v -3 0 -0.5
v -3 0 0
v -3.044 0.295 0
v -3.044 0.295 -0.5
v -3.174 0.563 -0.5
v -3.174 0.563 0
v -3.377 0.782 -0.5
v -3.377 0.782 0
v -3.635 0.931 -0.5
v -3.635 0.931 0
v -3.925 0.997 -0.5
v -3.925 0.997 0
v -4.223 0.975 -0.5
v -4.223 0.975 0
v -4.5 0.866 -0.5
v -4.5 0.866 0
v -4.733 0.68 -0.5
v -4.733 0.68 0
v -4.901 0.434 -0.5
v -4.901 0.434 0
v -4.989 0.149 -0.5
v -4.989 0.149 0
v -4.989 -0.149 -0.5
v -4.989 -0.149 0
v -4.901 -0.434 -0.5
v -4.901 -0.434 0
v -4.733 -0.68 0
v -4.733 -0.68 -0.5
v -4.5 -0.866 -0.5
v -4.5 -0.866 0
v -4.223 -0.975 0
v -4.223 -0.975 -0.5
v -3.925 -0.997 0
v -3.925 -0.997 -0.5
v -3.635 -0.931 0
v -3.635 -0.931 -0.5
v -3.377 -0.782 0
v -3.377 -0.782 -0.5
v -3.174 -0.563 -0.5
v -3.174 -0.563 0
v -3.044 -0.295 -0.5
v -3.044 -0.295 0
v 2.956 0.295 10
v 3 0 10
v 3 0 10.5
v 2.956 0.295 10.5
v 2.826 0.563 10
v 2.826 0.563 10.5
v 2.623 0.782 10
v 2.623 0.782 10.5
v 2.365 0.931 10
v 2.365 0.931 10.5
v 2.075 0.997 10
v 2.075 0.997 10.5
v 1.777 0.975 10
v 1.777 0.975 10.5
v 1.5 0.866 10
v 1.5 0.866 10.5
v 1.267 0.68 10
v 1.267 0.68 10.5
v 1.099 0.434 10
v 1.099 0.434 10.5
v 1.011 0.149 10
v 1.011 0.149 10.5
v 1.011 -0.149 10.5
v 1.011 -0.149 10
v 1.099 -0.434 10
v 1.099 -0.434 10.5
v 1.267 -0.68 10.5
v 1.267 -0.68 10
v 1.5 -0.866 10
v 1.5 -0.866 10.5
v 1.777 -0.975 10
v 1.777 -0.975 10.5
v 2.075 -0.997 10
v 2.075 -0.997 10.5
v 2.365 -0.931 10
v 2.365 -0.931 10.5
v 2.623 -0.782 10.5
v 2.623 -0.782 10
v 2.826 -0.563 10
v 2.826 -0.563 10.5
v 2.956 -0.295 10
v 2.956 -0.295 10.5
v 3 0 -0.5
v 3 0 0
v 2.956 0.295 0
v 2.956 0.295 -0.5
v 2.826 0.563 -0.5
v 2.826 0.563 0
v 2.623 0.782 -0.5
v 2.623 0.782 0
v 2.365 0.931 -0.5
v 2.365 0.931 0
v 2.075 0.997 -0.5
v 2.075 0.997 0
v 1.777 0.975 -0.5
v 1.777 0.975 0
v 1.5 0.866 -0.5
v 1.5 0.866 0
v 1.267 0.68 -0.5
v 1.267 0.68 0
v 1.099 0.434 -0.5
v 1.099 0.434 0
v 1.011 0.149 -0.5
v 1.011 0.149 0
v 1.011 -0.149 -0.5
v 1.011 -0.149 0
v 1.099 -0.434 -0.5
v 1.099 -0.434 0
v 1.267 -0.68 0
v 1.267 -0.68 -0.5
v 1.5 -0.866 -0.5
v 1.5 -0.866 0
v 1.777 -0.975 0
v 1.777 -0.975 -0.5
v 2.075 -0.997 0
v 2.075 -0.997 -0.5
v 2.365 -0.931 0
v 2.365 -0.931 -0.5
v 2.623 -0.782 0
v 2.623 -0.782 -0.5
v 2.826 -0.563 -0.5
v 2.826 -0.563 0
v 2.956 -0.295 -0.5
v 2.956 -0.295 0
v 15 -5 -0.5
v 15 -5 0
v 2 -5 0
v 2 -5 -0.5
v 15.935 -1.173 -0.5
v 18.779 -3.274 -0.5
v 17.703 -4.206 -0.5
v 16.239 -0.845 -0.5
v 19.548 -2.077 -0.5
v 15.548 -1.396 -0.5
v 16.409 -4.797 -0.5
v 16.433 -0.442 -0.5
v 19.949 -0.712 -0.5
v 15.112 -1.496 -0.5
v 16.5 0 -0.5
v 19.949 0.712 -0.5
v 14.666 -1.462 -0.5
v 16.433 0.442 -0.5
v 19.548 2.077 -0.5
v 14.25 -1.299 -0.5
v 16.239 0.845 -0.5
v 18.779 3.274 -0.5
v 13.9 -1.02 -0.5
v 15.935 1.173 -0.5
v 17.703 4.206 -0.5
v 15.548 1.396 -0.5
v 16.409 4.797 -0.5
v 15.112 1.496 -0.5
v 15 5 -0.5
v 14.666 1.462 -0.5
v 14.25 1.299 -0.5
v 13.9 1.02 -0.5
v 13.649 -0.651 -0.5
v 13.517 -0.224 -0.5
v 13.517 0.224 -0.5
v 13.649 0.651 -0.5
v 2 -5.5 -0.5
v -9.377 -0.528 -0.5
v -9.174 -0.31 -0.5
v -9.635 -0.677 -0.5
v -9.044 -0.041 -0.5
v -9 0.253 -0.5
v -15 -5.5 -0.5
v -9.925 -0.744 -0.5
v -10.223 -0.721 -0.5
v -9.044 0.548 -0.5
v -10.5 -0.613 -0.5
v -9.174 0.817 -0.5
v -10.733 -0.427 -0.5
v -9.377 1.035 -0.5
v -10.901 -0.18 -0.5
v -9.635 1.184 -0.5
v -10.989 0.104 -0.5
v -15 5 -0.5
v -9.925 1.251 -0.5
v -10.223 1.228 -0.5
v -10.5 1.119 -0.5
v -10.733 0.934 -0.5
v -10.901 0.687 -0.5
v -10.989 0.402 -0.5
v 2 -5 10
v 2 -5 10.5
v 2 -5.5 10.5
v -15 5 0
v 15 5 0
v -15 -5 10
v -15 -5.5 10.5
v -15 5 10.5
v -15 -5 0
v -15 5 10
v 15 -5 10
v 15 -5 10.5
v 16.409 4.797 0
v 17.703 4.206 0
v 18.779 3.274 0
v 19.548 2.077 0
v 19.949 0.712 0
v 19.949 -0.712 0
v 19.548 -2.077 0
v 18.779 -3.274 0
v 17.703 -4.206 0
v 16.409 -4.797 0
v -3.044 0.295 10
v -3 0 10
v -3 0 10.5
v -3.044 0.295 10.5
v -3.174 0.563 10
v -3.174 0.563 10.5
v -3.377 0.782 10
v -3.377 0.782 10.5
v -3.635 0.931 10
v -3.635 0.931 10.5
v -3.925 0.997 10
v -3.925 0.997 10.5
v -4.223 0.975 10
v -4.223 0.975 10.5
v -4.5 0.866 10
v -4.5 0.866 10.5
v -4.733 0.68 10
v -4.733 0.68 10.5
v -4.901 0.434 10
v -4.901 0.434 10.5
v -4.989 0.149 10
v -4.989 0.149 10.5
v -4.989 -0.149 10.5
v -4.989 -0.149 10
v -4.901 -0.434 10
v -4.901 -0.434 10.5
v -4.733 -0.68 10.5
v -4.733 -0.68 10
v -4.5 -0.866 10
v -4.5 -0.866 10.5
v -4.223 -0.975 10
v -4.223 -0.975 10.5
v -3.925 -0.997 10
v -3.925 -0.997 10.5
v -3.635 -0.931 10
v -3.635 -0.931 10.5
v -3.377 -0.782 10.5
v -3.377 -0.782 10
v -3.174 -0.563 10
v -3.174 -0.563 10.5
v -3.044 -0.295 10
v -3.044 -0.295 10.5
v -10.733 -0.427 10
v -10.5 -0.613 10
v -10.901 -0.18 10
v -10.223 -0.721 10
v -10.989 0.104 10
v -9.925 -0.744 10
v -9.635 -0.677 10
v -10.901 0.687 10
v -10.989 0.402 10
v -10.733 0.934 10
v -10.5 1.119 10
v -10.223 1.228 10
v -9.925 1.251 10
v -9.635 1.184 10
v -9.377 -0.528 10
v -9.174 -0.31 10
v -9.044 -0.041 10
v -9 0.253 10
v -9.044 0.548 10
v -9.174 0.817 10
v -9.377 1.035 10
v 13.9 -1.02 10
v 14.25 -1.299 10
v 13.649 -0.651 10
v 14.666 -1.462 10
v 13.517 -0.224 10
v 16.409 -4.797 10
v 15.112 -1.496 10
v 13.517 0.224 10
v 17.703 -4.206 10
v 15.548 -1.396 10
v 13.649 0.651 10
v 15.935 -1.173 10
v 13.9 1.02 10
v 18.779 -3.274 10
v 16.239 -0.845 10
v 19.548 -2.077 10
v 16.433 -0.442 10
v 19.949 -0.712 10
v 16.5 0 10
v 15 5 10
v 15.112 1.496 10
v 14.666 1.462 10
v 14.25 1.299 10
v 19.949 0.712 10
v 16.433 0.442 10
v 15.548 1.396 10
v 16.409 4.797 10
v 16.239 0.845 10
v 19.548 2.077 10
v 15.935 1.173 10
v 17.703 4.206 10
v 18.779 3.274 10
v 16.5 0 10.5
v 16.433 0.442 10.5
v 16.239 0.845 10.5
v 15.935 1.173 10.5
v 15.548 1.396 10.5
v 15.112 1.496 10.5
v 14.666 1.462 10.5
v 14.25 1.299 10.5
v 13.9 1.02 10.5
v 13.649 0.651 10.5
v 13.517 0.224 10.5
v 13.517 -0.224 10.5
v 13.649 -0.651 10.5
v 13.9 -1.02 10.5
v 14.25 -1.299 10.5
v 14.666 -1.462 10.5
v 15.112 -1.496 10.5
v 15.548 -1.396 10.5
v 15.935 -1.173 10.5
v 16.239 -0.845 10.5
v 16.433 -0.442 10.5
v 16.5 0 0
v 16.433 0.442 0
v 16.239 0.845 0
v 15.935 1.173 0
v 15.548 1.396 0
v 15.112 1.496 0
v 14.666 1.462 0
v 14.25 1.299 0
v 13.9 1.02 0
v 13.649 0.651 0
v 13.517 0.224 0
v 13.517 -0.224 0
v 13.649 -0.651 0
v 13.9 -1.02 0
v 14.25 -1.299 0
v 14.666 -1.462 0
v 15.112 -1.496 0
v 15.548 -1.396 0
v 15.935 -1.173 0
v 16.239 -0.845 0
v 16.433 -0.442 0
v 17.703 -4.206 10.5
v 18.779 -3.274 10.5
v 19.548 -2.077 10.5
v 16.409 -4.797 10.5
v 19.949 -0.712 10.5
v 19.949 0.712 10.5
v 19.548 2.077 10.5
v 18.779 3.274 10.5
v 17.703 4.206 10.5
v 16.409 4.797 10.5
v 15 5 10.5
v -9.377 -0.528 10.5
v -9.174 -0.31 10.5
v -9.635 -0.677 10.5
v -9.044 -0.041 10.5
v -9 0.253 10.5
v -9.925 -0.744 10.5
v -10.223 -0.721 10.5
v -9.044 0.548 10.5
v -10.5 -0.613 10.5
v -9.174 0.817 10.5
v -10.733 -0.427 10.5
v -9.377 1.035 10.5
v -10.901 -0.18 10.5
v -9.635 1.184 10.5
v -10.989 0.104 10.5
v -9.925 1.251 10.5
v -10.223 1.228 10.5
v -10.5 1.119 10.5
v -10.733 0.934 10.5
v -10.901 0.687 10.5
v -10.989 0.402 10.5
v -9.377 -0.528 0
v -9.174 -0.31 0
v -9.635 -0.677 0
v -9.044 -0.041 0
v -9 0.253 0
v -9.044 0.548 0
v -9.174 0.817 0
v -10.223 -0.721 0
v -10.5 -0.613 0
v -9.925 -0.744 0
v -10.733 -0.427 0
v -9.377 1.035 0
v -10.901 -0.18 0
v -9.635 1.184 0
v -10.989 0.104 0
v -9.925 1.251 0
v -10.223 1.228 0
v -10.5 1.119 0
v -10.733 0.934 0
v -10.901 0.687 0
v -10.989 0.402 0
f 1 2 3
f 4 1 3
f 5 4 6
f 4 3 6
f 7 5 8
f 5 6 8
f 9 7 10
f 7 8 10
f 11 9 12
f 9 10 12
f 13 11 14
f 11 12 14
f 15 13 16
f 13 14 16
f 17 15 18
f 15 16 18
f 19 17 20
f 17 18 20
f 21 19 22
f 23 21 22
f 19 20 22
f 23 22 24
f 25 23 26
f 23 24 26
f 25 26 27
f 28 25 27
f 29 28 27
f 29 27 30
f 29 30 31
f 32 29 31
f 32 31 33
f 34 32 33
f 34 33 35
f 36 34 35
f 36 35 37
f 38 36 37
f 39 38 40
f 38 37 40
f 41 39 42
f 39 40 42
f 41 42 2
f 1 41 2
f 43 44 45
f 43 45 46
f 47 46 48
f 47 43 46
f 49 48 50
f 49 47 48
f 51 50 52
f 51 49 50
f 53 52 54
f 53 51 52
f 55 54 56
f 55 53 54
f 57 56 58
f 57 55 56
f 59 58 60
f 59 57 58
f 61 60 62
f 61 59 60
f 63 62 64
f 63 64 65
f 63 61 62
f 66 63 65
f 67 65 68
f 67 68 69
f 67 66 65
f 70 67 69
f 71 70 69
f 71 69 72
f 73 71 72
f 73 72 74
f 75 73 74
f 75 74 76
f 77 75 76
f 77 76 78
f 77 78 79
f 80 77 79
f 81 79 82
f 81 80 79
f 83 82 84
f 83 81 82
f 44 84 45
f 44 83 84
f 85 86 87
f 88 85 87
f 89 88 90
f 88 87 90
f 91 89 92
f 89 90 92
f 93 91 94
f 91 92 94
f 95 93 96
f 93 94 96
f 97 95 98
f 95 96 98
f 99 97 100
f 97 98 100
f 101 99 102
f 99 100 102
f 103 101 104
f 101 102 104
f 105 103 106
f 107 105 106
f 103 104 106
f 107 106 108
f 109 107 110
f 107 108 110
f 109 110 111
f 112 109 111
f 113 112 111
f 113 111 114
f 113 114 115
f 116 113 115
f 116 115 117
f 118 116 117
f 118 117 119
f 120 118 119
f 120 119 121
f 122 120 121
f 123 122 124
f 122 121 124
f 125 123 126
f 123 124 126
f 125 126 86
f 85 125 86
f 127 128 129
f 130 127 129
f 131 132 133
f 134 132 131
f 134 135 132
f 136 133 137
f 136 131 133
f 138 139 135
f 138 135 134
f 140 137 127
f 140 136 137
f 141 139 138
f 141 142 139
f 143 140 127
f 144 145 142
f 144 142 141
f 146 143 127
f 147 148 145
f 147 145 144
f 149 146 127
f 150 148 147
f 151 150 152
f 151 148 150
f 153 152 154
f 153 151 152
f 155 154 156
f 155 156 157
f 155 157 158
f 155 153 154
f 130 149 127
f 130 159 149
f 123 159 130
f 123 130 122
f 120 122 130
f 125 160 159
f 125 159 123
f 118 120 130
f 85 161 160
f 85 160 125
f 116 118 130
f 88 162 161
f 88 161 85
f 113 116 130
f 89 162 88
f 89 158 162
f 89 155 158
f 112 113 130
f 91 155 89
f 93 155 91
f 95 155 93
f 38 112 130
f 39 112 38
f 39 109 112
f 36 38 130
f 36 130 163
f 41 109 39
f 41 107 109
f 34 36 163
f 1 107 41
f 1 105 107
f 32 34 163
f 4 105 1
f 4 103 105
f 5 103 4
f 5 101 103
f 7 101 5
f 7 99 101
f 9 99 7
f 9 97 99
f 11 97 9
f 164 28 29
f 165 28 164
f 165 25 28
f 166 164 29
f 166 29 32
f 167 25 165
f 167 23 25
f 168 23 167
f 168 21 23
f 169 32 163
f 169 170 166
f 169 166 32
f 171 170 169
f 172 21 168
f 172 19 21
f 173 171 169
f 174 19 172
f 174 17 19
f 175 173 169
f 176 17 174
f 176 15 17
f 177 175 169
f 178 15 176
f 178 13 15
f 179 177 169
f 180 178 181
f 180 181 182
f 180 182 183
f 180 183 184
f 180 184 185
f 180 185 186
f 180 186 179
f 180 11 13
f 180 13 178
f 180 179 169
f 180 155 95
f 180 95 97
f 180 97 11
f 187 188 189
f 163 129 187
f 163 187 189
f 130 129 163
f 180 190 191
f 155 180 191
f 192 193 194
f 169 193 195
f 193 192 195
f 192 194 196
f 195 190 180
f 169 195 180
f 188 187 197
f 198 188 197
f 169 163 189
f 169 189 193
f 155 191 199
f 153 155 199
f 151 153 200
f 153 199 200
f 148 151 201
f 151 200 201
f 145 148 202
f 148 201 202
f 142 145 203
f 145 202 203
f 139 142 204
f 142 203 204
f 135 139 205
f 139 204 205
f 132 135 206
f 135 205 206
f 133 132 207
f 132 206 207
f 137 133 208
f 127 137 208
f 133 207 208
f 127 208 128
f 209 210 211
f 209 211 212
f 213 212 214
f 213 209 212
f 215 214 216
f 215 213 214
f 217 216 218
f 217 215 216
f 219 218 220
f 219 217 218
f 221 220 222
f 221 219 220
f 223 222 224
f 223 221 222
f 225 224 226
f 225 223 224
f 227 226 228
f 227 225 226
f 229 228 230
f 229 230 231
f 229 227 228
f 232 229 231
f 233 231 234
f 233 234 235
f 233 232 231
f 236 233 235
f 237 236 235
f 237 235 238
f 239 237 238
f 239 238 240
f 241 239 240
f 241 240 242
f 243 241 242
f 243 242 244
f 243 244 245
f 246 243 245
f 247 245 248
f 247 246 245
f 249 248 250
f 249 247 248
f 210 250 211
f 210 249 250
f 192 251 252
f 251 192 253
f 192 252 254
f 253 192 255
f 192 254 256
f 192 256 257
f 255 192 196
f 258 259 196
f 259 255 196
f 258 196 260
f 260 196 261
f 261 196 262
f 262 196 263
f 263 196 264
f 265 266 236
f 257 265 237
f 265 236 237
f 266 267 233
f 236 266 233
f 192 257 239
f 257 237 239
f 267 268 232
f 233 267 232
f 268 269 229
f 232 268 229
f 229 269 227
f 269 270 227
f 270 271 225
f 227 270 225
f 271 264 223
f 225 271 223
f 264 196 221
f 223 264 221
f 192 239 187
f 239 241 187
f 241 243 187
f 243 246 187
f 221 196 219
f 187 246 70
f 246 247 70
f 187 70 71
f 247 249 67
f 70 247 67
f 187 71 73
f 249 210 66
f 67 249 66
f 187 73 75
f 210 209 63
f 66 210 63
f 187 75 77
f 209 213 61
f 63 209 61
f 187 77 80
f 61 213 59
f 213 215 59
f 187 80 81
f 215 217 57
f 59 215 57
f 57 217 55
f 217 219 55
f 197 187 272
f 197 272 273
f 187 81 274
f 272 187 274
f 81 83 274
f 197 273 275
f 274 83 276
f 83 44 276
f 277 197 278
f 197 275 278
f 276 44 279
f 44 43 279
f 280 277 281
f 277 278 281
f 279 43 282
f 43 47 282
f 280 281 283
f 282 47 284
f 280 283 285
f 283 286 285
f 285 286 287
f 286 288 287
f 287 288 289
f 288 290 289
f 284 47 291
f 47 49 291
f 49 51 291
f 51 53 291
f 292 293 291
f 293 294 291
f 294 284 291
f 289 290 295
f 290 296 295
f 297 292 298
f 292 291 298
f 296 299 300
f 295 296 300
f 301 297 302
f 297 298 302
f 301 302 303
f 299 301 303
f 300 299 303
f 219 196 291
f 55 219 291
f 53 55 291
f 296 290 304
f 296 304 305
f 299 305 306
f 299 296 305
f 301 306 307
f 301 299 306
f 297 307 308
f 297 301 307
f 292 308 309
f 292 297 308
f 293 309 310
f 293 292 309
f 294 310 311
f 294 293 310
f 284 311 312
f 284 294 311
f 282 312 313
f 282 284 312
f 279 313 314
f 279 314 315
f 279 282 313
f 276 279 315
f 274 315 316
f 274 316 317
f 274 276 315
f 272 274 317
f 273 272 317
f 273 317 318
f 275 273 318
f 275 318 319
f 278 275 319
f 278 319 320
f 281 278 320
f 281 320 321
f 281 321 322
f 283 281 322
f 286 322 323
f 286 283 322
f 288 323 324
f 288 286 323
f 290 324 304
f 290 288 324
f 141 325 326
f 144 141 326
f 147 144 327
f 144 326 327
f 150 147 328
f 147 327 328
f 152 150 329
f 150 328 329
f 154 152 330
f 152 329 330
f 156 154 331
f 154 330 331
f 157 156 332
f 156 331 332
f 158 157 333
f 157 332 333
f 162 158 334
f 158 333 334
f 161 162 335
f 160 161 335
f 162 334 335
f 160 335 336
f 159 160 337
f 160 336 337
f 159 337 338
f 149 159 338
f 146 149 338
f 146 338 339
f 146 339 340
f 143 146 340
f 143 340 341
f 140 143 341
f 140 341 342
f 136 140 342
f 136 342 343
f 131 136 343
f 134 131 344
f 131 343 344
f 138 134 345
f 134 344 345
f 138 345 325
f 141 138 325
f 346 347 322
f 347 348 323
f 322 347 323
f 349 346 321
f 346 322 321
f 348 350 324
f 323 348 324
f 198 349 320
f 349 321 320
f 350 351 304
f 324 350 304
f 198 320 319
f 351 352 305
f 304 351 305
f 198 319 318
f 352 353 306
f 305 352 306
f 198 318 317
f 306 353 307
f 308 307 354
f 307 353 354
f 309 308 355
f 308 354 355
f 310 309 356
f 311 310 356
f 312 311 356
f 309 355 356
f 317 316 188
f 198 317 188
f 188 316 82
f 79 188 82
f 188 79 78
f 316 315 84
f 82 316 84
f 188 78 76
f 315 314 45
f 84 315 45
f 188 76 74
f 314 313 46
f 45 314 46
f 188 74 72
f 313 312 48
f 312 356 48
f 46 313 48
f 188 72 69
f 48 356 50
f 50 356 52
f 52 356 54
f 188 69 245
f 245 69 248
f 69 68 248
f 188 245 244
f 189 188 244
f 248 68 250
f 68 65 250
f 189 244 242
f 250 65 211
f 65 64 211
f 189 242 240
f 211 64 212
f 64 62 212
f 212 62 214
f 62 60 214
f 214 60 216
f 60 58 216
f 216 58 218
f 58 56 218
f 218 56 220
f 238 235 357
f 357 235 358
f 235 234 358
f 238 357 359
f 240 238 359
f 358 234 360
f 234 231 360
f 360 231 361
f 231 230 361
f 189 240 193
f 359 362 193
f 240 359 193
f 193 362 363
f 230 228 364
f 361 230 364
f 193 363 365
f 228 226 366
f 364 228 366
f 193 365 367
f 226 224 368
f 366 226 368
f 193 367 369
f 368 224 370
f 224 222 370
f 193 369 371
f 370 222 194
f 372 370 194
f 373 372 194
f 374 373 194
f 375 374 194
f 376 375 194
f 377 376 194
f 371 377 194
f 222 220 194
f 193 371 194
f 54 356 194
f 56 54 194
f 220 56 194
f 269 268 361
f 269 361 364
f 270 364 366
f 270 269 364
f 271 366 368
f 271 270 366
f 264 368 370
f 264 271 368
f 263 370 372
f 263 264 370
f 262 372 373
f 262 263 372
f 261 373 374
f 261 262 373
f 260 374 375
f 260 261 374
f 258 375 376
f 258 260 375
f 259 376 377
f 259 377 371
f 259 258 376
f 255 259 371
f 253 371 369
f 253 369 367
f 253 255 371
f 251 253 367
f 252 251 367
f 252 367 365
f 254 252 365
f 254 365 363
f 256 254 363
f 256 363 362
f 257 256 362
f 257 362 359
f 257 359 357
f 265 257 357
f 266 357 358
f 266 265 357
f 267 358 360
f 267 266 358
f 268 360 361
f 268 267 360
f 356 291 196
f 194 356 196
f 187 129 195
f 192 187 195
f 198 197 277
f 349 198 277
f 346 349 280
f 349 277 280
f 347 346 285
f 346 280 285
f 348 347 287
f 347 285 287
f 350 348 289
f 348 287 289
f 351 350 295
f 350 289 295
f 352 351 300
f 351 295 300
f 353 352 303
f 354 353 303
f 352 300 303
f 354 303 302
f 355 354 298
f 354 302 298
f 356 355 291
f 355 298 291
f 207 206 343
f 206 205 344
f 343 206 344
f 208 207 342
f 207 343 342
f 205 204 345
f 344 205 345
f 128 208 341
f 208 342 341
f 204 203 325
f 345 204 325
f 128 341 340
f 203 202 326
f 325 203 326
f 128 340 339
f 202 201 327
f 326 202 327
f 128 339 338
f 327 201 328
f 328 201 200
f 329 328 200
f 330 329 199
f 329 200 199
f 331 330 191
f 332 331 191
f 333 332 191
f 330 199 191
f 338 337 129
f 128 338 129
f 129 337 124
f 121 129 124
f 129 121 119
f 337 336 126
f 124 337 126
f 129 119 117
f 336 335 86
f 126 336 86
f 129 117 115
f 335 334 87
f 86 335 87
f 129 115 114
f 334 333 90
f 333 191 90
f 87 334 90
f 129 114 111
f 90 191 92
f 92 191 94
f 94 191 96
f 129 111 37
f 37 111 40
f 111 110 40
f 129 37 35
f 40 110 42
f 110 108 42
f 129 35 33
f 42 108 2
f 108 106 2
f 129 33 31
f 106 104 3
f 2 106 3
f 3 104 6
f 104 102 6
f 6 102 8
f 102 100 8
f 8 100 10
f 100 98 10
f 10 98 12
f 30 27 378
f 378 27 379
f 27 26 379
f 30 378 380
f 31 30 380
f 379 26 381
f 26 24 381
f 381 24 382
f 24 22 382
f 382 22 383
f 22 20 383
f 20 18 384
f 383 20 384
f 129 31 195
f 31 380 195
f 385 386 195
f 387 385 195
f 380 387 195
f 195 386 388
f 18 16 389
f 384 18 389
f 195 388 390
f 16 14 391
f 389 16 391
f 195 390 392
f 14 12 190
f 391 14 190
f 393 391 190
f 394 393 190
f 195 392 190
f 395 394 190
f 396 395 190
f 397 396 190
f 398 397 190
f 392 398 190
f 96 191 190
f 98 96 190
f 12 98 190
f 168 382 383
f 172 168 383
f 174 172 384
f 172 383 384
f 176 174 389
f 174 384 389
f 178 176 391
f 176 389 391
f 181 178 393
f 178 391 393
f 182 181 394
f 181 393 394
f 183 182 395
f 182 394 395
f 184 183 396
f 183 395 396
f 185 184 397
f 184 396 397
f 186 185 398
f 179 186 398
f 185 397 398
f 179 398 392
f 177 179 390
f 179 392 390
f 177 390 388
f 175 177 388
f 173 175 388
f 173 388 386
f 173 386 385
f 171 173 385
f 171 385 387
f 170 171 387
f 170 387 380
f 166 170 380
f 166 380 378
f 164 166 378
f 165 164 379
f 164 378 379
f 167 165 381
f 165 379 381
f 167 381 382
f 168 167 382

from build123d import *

# Parameters (mm, degrees)
SKETCH_2_R      = 1.5
SKETCH_2_R_2    = 1
EXTRUDE_1_DEPTH = 0.5
SKETCH_1_R      = 1.5
SKETCH_1_R_2    = 1
EXTRUDE_2_DEPTH = 0.5
SKETCH_3_W      = 17
SKETCH_3_H      = 11
EXTRUDE_3_DEPTH = 0.5


with BuildPart() as part:
    # 草图2 → 凸台-拉伸1 (new body)
    with BuildSketch(Plane.XY.offset(10)):
        with BuildLine():
            Line((15, 5), (-15, 5))
            Line((-15, 5), (-15, -5))
            Line((-15, -5), (15, -5))
            ThreePointArc((15, -5), (20, 0), (15, 5))
        make_face()
        with Locations((15, 0)):
            Circle(SKETCH_2_R, mode=Mode.SUBTRACT)
        with Locations((2, 0)):
            Circle(SKETCH_2_R_2, mode=Mode.SUBTRACT)
        with Locations((-4, 0)):
            Circle(SKETCH_2_R_2, mode=Mode.SUBTRACT)
        with Locations((-10, 0.253438211)):
            Circle(SKETCH_2_R_2, mode=Mode.SUBTRACT)
    extrude(amount=EXTRUDE_1_DEPTH)



with BuildPart() as body_2:
    # 草图1 → 凸台-拉伸2 (new body)
    with BuildSketch(Plane.XY):
        with BuildLine():
            Line((-15, 5), (15, 5))
            ThreePointArc((15, 5), (20, 0), (15, -5))
            Line((15, -5), (-15, -5))
            Line((-15, -5), (-15, 5))
        make_face()
        with Locations((15, 0)):
            Circle(SKETCH_1_R, mode=Mode.SUBTRACT)
        with Locations((-10, 0.253438211)):
            Circle(SKETCH_1_R_2, mode=Mode.SUBTRACT)
        with Locations((-4, 0)):
            Circle(SKETCH_1_R_2, mode=Mode.SUBTRACT)
        with Locations((2, 0)):
            Circle(SKETCH_1_R_2, mode=Mode.SUBTRACT)
    extrude(amount=-EXTRUDE_2_DEPTH)


with BuildPart() as part_1:
    add(part.part)

    add(body_2.part)  # 凸台-拉伸3 merges body 2
    # 草图3 → 凸台-拉伸3 (add)
    with BuildSketch(Plane(origin=(0, -5, 0), x_dir=(-1, 0, 0), z_dir=(0, -1, 0))):
        with Locations((6.5, -5)):
            Rectangle(SKETCH_3_W, SKETCH_3_H)
    extrude(amount=EXTRUDE_3_DEPTH)


solid = part_1.part
